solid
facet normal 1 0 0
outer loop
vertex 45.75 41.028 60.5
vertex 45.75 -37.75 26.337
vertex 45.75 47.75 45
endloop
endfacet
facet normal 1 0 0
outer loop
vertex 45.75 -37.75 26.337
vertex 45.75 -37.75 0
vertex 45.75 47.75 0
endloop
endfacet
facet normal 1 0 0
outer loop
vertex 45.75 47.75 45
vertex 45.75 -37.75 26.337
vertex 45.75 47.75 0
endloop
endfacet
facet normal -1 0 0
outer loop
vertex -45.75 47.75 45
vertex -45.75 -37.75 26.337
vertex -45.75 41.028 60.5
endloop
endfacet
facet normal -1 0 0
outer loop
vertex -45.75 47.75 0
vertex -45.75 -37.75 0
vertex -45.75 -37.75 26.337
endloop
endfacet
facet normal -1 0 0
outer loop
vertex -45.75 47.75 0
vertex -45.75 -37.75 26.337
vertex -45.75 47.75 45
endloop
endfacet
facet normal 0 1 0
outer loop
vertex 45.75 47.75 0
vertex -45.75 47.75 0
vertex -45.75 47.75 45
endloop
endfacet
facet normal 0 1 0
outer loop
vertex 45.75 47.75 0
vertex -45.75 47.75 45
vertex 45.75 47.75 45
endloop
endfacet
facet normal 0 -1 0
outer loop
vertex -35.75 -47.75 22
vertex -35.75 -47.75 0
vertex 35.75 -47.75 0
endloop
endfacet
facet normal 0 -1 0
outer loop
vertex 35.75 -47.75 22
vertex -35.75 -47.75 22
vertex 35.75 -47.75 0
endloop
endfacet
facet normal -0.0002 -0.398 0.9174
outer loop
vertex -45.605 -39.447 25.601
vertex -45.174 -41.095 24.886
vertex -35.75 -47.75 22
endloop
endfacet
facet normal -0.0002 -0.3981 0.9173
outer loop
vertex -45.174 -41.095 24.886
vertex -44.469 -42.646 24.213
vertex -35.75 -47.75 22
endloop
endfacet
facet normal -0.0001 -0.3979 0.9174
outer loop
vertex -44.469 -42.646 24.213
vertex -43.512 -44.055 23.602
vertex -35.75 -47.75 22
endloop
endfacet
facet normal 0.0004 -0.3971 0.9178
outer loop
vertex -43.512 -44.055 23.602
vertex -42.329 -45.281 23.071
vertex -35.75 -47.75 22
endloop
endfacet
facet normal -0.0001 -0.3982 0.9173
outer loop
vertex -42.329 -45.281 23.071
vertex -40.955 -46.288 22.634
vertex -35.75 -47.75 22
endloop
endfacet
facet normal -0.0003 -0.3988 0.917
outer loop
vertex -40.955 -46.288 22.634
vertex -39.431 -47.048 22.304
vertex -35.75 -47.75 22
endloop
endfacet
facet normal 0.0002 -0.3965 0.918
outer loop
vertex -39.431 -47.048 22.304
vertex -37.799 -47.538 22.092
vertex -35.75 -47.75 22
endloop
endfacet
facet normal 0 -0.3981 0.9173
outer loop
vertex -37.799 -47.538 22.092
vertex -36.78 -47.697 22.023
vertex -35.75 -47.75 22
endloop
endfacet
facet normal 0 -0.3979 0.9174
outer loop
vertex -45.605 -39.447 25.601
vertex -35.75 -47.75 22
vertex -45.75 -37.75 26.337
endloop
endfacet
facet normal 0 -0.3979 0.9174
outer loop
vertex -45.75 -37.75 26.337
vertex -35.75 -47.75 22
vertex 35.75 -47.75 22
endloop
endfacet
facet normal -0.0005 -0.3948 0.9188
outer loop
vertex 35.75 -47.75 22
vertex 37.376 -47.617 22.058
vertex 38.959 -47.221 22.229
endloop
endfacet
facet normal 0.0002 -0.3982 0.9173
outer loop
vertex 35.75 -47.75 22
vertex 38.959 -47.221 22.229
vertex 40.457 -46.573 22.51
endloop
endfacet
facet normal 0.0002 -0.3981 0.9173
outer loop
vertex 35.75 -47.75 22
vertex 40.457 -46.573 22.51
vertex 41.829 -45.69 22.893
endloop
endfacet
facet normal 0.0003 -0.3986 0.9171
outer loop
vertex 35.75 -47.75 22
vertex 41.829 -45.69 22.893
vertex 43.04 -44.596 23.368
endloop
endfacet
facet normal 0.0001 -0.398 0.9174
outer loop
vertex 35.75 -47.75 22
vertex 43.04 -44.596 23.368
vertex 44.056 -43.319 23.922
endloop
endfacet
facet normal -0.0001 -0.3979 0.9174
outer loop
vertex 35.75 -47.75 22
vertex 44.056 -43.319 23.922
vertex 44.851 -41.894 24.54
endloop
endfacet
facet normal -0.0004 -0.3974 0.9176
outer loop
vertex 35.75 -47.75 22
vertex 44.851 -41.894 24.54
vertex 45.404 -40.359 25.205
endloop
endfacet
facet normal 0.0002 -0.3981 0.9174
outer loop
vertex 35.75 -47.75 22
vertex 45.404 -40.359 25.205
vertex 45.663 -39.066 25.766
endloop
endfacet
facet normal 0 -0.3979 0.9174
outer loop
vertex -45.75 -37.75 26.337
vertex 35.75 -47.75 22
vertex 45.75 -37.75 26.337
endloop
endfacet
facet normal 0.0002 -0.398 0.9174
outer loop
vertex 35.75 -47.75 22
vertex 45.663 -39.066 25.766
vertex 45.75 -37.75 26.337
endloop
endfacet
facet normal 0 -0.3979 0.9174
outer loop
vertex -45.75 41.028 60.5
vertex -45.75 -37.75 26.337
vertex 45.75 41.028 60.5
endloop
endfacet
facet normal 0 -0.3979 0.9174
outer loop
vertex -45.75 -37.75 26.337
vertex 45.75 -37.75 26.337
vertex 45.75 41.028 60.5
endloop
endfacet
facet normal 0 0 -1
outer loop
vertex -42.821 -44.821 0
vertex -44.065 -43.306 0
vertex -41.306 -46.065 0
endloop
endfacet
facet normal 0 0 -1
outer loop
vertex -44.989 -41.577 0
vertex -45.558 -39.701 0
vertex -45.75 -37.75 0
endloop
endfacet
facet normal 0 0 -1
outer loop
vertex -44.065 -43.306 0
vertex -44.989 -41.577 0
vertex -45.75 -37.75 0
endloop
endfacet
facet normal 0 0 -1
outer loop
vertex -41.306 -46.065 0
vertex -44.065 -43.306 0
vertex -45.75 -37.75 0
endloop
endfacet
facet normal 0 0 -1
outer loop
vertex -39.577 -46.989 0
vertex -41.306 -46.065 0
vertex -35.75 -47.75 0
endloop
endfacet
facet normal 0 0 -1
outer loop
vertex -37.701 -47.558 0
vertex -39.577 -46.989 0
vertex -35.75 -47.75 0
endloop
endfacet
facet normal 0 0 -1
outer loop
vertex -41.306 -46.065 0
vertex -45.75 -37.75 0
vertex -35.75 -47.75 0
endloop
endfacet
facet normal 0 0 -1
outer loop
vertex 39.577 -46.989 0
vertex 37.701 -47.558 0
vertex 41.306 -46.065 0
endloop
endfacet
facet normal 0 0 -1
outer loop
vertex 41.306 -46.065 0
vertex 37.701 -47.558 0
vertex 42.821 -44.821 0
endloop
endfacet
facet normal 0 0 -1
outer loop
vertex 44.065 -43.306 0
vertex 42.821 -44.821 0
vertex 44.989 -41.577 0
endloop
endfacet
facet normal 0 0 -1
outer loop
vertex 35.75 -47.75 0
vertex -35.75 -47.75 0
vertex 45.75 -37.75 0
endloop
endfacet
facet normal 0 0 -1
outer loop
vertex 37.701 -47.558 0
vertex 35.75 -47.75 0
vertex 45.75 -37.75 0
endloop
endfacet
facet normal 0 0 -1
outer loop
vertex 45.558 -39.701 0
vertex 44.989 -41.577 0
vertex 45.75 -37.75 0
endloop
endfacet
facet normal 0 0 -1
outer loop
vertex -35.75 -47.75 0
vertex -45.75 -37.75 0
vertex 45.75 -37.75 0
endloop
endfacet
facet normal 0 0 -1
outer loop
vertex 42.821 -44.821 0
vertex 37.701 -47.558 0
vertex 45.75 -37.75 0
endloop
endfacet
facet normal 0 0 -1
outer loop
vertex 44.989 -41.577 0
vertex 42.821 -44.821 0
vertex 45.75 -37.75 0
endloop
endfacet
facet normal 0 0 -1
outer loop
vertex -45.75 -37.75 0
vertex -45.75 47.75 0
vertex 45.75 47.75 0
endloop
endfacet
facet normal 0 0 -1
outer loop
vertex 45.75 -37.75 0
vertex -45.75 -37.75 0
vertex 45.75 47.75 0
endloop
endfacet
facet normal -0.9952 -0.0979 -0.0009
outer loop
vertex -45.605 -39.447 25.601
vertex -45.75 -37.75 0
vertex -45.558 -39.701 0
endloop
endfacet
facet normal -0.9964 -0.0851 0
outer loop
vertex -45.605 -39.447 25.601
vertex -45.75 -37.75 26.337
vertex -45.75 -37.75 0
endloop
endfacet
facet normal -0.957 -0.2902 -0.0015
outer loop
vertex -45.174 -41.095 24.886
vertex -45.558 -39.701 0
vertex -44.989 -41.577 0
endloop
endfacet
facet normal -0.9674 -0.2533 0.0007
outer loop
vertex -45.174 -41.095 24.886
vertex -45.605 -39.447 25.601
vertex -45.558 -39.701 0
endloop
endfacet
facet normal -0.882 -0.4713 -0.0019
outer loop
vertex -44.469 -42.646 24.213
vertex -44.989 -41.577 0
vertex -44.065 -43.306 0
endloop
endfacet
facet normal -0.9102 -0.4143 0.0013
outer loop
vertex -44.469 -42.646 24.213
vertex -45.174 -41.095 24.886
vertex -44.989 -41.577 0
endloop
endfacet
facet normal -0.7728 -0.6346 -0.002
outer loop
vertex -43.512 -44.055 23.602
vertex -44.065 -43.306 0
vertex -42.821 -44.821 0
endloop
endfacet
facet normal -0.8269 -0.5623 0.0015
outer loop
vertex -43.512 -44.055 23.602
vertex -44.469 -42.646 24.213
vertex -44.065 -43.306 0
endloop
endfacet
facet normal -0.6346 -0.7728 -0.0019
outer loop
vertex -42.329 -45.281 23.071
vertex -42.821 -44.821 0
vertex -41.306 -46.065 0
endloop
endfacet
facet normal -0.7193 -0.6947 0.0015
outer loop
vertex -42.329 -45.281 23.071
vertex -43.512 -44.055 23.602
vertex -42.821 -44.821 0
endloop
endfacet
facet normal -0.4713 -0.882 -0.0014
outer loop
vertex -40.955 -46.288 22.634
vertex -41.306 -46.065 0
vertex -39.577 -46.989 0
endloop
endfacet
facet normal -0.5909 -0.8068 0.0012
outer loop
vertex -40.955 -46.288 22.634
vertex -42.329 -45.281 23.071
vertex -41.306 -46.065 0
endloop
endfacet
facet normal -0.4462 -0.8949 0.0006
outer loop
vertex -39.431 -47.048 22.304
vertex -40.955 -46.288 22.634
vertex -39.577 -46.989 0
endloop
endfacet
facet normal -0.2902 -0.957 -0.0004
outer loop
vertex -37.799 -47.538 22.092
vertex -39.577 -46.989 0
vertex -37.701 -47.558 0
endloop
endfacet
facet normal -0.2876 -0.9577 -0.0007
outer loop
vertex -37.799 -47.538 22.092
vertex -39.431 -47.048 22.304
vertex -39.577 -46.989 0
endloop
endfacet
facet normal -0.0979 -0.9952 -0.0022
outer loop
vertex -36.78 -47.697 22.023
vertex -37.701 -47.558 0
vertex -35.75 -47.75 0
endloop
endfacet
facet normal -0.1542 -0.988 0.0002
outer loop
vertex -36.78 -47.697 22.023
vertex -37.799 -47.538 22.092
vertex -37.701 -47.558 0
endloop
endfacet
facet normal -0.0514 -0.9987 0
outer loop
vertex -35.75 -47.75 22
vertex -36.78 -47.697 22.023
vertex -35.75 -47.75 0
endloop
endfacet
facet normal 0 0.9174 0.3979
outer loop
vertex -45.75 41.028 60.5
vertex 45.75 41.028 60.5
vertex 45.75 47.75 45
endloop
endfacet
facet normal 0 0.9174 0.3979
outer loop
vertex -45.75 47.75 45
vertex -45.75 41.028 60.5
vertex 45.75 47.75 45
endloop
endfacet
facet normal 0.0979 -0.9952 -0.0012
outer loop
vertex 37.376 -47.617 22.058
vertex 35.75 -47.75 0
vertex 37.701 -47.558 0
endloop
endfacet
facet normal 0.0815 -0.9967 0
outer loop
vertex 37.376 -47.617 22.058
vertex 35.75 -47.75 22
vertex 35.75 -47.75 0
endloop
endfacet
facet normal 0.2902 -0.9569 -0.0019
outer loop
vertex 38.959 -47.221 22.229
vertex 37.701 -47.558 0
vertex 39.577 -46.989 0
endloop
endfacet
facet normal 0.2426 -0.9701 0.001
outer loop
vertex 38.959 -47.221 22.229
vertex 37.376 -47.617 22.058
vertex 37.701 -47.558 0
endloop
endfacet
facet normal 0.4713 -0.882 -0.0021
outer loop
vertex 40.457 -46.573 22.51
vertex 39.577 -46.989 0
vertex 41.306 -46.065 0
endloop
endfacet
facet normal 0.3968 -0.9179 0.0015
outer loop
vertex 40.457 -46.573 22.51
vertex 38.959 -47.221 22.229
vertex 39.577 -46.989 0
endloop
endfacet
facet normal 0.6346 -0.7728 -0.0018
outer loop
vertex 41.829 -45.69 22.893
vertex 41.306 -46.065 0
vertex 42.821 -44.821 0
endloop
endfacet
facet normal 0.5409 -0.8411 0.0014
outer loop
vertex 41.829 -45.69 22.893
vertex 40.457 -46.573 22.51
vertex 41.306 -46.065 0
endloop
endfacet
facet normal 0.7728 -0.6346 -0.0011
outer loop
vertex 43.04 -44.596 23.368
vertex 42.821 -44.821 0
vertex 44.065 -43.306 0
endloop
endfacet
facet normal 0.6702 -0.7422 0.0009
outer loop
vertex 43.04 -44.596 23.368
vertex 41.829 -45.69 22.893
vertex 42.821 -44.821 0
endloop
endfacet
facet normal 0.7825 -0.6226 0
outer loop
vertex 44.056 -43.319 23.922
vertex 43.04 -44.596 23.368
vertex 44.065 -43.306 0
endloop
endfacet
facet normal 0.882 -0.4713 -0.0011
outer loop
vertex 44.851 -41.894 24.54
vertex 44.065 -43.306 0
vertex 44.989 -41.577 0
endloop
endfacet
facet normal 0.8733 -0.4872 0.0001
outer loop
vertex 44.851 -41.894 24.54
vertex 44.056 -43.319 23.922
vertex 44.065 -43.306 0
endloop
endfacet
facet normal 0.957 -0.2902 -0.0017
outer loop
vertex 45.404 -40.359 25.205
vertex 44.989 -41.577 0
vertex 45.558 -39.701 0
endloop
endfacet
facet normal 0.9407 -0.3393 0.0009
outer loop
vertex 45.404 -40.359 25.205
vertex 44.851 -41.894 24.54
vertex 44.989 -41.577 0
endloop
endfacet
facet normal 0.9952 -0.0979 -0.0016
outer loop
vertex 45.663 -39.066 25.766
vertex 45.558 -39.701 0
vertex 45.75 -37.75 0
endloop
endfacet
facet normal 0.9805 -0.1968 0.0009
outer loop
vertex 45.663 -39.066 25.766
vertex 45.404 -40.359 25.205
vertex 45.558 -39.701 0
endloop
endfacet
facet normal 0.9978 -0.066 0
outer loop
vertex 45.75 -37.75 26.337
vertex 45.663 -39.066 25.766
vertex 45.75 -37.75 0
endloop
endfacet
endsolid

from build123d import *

# Parameters (mm, degrees)
SKETCH_W          = 91.5
SKETCH_H          = 95.5
PAD_DEPTH         = 60.5
POCKET_DEPTH      = 45.751
POCKET_DEPTH_BACK = 45.751
FILLET_R          = 10


with BuildPart() as part:
    # Sketch (on XY_Plane of Origin) → Pad (new body)
    with BuildSketch(Plane.XY):
        Rectangle(SKETCH_W, SKETCH_H)
    extrude(amount=PAD_DEPTH)

    # Sketch001 (on YZ_Plane of Origin) → Pocket (cut, two sides)
    with BuildSketch(Plane.YZ) as pocket_sk:
        Polygon((-47.75, 22), (41.028192, 60.5), (47.75, 45), (57.75, 45), (57.75, 70.5), (-57.75, 70.5), (-57.75, 22), align=None)
    extrude(amount=-POCKET_DEPTH, mode=Mode.SUBTRACT)
    extrude(pocket_sk.sketch, amount=POCKET_DEPTH_BACK, mode=Mode.SUBTRACT)

    # Fillet
    fillet_edges = [part.edges().sort_by_distance(p)[0] for p in [
        (45.75, -47.75, 11),
        (-45.75, -47.75, 11),
    ]]
    fillet(fillet_edges, radius=FILLET_R)


solid = part.part
